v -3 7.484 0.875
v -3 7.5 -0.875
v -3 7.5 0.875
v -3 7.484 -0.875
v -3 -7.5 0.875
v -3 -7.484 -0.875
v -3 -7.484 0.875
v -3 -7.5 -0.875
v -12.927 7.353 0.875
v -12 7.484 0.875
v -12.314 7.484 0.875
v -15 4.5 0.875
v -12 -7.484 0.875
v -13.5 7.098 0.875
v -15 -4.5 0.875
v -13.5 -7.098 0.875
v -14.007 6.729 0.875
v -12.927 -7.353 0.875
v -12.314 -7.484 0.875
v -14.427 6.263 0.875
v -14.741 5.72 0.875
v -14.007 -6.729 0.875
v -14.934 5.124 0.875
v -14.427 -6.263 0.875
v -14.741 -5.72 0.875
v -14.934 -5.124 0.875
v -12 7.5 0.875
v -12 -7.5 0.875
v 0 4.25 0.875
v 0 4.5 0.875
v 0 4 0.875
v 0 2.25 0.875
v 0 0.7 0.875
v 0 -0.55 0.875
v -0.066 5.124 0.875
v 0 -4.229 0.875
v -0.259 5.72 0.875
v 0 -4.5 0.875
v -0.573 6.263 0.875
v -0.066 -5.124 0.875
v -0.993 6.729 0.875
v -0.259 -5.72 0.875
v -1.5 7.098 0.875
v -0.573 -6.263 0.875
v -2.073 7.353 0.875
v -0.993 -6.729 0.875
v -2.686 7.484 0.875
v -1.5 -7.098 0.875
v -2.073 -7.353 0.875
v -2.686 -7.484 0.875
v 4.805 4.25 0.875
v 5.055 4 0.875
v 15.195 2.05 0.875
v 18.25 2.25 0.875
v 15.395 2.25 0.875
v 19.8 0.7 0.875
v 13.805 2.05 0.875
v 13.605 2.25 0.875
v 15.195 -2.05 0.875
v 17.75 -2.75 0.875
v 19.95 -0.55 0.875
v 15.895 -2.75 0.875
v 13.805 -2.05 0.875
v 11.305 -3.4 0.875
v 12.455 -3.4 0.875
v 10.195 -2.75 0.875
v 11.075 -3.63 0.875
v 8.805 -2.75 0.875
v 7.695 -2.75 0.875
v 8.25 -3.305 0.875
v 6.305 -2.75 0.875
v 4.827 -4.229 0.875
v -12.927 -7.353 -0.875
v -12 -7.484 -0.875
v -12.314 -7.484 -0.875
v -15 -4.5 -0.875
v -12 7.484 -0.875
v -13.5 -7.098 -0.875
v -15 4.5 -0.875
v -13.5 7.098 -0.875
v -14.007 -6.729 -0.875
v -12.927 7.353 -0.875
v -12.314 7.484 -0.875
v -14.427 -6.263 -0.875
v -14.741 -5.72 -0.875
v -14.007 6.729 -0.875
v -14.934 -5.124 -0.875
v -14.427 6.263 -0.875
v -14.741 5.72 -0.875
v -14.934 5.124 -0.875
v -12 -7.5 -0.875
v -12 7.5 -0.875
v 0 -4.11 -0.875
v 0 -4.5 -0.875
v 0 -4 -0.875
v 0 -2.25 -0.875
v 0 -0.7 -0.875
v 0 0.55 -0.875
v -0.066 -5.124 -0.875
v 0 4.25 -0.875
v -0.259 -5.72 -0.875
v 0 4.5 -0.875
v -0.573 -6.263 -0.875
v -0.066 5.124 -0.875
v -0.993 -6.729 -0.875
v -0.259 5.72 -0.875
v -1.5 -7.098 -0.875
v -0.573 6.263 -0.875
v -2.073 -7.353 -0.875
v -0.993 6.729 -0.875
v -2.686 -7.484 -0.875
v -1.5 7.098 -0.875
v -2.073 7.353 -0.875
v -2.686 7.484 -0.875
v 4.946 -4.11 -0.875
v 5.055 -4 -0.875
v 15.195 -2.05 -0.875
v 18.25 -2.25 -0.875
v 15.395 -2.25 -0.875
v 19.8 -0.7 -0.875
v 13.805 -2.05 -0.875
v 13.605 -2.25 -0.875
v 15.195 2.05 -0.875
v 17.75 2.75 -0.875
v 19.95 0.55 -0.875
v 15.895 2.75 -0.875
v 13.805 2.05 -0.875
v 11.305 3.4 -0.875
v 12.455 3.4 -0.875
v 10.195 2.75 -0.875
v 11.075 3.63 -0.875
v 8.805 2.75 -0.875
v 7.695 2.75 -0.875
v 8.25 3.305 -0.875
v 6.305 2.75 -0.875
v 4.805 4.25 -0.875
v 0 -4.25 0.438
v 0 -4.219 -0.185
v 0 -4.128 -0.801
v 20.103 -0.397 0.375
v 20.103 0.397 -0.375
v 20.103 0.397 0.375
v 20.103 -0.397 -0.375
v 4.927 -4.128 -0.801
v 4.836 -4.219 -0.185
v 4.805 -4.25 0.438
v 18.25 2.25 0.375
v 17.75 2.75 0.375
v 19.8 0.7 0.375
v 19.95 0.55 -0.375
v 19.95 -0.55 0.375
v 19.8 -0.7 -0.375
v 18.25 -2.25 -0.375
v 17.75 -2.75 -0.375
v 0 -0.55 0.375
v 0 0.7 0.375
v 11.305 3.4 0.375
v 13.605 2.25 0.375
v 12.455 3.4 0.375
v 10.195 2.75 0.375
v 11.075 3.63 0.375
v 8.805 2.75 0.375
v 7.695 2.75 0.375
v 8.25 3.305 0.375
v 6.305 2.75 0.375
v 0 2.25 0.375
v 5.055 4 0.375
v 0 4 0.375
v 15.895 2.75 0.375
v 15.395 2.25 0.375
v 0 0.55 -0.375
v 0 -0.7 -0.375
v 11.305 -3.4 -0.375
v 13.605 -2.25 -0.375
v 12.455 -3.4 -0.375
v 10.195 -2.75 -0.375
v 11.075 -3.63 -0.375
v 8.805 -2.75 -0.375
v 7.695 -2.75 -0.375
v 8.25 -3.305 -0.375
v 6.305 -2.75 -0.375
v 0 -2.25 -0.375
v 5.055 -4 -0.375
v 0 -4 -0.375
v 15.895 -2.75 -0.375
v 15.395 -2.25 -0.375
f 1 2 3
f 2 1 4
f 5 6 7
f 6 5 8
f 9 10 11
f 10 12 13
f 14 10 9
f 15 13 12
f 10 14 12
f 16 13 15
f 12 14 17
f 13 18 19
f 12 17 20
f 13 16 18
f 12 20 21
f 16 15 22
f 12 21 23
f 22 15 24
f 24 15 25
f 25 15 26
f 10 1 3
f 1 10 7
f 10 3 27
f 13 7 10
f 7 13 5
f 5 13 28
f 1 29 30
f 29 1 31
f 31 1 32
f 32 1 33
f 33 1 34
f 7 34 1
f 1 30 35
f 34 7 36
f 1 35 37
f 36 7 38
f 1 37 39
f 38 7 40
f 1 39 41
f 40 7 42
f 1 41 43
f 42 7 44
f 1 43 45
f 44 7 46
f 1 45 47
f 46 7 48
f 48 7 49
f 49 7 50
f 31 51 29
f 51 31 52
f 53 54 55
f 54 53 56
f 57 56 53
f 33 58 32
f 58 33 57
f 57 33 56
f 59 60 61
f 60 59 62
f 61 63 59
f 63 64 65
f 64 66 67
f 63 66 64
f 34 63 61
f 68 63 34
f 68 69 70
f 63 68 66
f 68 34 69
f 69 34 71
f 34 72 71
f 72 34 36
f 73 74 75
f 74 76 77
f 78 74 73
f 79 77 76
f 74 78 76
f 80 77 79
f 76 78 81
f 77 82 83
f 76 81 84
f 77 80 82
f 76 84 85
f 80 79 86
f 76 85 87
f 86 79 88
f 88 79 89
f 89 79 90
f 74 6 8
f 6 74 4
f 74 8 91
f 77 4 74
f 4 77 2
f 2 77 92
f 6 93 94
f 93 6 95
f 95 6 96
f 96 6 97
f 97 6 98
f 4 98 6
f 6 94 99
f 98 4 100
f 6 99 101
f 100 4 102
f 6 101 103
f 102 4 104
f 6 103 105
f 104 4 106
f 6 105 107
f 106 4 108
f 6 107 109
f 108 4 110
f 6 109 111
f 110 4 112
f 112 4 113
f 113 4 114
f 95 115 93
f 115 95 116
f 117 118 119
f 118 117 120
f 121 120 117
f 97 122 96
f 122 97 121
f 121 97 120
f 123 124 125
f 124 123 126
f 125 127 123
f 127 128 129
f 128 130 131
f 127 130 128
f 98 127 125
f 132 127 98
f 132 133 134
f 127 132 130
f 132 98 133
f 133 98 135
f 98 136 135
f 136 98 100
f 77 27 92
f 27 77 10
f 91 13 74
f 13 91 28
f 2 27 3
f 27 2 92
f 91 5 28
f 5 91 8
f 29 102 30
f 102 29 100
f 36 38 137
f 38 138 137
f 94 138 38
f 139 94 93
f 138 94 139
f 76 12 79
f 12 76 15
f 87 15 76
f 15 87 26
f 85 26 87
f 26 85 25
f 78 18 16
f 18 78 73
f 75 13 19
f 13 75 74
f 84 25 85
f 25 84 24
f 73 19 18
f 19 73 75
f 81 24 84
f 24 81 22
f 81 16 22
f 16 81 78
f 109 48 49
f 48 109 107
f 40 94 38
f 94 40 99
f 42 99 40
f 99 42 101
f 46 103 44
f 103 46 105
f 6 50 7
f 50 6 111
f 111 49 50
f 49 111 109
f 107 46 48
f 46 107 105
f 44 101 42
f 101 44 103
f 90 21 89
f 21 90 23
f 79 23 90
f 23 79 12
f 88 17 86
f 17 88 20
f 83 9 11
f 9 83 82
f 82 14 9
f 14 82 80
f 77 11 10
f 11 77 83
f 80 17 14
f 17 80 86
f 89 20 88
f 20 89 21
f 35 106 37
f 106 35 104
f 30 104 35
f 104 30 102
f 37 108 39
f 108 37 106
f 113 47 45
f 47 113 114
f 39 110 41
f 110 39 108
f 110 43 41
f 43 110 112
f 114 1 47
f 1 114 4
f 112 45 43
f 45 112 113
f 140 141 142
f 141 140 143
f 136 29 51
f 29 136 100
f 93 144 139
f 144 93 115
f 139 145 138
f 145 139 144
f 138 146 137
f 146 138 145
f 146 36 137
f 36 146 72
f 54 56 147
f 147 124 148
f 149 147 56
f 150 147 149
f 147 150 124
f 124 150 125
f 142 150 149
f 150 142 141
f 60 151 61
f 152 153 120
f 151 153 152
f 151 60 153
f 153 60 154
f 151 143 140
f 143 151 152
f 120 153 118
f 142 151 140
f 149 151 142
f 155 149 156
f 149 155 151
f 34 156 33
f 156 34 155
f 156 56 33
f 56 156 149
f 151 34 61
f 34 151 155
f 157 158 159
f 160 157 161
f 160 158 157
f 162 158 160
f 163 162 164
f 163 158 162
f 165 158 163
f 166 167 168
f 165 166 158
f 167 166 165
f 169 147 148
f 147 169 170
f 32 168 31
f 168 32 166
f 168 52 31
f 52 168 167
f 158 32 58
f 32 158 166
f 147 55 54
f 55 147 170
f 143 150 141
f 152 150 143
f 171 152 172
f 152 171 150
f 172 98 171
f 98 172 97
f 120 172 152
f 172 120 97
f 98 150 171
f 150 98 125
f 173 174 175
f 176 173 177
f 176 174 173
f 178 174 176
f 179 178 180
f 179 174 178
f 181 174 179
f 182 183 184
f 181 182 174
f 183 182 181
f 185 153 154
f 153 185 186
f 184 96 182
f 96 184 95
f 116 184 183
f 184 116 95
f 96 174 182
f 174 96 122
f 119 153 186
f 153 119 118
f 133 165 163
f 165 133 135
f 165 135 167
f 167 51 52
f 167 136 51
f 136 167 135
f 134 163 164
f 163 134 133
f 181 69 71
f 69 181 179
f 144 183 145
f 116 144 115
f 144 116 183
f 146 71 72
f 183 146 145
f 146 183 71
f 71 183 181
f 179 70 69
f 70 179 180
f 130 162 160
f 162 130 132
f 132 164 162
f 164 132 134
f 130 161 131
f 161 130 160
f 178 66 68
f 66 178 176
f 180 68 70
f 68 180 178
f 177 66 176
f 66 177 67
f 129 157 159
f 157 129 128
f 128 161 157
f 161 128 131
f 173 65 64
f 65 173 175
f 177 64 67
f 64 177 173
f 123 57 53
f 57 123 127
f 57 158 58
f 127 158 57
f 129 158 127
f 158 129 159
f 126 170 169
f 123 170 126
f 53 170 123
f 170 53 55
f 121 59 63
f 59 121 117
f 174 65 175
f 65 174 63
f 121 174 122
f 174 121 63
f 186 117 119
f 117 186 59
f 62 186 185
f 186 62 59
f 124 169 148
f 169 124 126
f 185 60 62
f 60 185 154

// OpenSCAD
// Original Key by Nirav Patel <http://eclecti.cc>
// This work is licensed under a Creative Commons Attribution 3.0 Unported License.

//The measurements used below are from the center of the key to the cut. All measurements are in mm. 
//(cut at the handle of key)
cut_1 = 150;
cut_2 = 150;
cut_3 = 85;
cut_4 = 220;
cut_5 = 150;
//(cut at the tip of key)

function mm(i) = i*25.4;
$fn=30;

module rounded(size, r) {
  union() {
    translate([r, 0, 0]) cube([size[0]-2*r, size[1], size[2]]);
    translate([0, r, 0]) cube([size[0], size[1]-2*r, size[2]]);
    translate([r, r, 0]) cylinder(h=size[2], r=r);
    translate([size[0]-r, r, 0]) cylinder(h=size[2], r=r);
    translate([r, size[1]-r, 0]) cylinder(h=size[2], r=r);
    translate([size[0]-r, size[1]-r, 0]) cylinder(h=size[2], r=r);
  }
}

module bit() {
  w = 6;
  difference() {
    translate([-w/2, 0, 0]) cube([w, 20, w]);
    translate([-mm(7/256), 0, 0]) rotate([0, 0, 135]) cube([w, w, w]);
    translate([mm(7/256), 0, 0]) rotate([0, 0, -45]) cube([w, w, w]);
  }
}

// Schlage SC1 5 pin key.  The measurements are mostly guesses based on reverse
// engineering some keys I have and some publicly available information.
module safeKey(bits) {
  // You may need to adjust these to fit your specific printer settings
  thickness = 1.75;//mm
  length = 20.5;//mm
  width = 8.5;//mm
  
  shoulder = 7;
  pin_spacing = 2.5;
  depth_inc = 0.01;

  // Handle size
  h_l = 15;
  h_d = thickness;
  difference() {
    // blade and key handle
    union() {
      translate([-h_l, -h_l/2, -h_d/2]) rounded([h_l, h_l, thickness], 3);
      translate([0, -width/2, -thickness/2])intersection() {
        // cut a little off the tip to avoid going too long
        cube([length - mm(1/64), width, thickness]);
        translate([0, mm(1/4), thickness*3/4]) rotate([0, 90, 0]) cylinder(h=length, r=mm(1/4), $fn=64);
      }
    }
    
    // chamfer the tip
    translate([length, 0, -thickness/2]) {
      rotate([0, 0, 45]) cube([10, 10, thickness]);
      rotate([0, 0, 225]) cube([10, 10, thickness]);
      
    }
    translate([length -6, -width/2 + bits[4]*depth_inc, thickness/2])rotate([180,0,0])cube([10, 10, thickness *2]);
    
    // cut the channels in the key.
    union() {
      translate([0, -width/2 + 3.7, thickness/2-0.5]) cube([length, 1.25, 0.5]);
      translate([0, -width/2 + 6.5, thickness/2-0.5]) cube([length, 1.75, 0.5]);
    }
    // cut the reverse channels in the key.
    rotate([180,0,0])union() {
      translate([0, -width/2 + 3.7, thickness/2-0.5]) cube([length, 1.25, 0.6]);
      translate([0, -width/2 + 6.5, thickness/2-0.5]) cube([length, 1.75, 0.6]);
    }

    // Cut the bitting
    for (b = [0:4]) {
      translate([shoulder + b*pin_spacing, width/2 - bits[b]*depth_inc, -thickness]) bit();
      translate([shoulder + b*pin_spacing, -width/2+ bits[b]*depth_inc, thickness])rotate([180,0,0]) bit();  
    }
    
    //This is a bit of a hack to fix the last pin
    translate([length -6, width/2 - bits[4]*depth_inc, -thickness/2])cube([10, 10, thickness]);
  }
}


safeKey([cut_1,cut_2,cut_3,cut_4,cut_5]);
